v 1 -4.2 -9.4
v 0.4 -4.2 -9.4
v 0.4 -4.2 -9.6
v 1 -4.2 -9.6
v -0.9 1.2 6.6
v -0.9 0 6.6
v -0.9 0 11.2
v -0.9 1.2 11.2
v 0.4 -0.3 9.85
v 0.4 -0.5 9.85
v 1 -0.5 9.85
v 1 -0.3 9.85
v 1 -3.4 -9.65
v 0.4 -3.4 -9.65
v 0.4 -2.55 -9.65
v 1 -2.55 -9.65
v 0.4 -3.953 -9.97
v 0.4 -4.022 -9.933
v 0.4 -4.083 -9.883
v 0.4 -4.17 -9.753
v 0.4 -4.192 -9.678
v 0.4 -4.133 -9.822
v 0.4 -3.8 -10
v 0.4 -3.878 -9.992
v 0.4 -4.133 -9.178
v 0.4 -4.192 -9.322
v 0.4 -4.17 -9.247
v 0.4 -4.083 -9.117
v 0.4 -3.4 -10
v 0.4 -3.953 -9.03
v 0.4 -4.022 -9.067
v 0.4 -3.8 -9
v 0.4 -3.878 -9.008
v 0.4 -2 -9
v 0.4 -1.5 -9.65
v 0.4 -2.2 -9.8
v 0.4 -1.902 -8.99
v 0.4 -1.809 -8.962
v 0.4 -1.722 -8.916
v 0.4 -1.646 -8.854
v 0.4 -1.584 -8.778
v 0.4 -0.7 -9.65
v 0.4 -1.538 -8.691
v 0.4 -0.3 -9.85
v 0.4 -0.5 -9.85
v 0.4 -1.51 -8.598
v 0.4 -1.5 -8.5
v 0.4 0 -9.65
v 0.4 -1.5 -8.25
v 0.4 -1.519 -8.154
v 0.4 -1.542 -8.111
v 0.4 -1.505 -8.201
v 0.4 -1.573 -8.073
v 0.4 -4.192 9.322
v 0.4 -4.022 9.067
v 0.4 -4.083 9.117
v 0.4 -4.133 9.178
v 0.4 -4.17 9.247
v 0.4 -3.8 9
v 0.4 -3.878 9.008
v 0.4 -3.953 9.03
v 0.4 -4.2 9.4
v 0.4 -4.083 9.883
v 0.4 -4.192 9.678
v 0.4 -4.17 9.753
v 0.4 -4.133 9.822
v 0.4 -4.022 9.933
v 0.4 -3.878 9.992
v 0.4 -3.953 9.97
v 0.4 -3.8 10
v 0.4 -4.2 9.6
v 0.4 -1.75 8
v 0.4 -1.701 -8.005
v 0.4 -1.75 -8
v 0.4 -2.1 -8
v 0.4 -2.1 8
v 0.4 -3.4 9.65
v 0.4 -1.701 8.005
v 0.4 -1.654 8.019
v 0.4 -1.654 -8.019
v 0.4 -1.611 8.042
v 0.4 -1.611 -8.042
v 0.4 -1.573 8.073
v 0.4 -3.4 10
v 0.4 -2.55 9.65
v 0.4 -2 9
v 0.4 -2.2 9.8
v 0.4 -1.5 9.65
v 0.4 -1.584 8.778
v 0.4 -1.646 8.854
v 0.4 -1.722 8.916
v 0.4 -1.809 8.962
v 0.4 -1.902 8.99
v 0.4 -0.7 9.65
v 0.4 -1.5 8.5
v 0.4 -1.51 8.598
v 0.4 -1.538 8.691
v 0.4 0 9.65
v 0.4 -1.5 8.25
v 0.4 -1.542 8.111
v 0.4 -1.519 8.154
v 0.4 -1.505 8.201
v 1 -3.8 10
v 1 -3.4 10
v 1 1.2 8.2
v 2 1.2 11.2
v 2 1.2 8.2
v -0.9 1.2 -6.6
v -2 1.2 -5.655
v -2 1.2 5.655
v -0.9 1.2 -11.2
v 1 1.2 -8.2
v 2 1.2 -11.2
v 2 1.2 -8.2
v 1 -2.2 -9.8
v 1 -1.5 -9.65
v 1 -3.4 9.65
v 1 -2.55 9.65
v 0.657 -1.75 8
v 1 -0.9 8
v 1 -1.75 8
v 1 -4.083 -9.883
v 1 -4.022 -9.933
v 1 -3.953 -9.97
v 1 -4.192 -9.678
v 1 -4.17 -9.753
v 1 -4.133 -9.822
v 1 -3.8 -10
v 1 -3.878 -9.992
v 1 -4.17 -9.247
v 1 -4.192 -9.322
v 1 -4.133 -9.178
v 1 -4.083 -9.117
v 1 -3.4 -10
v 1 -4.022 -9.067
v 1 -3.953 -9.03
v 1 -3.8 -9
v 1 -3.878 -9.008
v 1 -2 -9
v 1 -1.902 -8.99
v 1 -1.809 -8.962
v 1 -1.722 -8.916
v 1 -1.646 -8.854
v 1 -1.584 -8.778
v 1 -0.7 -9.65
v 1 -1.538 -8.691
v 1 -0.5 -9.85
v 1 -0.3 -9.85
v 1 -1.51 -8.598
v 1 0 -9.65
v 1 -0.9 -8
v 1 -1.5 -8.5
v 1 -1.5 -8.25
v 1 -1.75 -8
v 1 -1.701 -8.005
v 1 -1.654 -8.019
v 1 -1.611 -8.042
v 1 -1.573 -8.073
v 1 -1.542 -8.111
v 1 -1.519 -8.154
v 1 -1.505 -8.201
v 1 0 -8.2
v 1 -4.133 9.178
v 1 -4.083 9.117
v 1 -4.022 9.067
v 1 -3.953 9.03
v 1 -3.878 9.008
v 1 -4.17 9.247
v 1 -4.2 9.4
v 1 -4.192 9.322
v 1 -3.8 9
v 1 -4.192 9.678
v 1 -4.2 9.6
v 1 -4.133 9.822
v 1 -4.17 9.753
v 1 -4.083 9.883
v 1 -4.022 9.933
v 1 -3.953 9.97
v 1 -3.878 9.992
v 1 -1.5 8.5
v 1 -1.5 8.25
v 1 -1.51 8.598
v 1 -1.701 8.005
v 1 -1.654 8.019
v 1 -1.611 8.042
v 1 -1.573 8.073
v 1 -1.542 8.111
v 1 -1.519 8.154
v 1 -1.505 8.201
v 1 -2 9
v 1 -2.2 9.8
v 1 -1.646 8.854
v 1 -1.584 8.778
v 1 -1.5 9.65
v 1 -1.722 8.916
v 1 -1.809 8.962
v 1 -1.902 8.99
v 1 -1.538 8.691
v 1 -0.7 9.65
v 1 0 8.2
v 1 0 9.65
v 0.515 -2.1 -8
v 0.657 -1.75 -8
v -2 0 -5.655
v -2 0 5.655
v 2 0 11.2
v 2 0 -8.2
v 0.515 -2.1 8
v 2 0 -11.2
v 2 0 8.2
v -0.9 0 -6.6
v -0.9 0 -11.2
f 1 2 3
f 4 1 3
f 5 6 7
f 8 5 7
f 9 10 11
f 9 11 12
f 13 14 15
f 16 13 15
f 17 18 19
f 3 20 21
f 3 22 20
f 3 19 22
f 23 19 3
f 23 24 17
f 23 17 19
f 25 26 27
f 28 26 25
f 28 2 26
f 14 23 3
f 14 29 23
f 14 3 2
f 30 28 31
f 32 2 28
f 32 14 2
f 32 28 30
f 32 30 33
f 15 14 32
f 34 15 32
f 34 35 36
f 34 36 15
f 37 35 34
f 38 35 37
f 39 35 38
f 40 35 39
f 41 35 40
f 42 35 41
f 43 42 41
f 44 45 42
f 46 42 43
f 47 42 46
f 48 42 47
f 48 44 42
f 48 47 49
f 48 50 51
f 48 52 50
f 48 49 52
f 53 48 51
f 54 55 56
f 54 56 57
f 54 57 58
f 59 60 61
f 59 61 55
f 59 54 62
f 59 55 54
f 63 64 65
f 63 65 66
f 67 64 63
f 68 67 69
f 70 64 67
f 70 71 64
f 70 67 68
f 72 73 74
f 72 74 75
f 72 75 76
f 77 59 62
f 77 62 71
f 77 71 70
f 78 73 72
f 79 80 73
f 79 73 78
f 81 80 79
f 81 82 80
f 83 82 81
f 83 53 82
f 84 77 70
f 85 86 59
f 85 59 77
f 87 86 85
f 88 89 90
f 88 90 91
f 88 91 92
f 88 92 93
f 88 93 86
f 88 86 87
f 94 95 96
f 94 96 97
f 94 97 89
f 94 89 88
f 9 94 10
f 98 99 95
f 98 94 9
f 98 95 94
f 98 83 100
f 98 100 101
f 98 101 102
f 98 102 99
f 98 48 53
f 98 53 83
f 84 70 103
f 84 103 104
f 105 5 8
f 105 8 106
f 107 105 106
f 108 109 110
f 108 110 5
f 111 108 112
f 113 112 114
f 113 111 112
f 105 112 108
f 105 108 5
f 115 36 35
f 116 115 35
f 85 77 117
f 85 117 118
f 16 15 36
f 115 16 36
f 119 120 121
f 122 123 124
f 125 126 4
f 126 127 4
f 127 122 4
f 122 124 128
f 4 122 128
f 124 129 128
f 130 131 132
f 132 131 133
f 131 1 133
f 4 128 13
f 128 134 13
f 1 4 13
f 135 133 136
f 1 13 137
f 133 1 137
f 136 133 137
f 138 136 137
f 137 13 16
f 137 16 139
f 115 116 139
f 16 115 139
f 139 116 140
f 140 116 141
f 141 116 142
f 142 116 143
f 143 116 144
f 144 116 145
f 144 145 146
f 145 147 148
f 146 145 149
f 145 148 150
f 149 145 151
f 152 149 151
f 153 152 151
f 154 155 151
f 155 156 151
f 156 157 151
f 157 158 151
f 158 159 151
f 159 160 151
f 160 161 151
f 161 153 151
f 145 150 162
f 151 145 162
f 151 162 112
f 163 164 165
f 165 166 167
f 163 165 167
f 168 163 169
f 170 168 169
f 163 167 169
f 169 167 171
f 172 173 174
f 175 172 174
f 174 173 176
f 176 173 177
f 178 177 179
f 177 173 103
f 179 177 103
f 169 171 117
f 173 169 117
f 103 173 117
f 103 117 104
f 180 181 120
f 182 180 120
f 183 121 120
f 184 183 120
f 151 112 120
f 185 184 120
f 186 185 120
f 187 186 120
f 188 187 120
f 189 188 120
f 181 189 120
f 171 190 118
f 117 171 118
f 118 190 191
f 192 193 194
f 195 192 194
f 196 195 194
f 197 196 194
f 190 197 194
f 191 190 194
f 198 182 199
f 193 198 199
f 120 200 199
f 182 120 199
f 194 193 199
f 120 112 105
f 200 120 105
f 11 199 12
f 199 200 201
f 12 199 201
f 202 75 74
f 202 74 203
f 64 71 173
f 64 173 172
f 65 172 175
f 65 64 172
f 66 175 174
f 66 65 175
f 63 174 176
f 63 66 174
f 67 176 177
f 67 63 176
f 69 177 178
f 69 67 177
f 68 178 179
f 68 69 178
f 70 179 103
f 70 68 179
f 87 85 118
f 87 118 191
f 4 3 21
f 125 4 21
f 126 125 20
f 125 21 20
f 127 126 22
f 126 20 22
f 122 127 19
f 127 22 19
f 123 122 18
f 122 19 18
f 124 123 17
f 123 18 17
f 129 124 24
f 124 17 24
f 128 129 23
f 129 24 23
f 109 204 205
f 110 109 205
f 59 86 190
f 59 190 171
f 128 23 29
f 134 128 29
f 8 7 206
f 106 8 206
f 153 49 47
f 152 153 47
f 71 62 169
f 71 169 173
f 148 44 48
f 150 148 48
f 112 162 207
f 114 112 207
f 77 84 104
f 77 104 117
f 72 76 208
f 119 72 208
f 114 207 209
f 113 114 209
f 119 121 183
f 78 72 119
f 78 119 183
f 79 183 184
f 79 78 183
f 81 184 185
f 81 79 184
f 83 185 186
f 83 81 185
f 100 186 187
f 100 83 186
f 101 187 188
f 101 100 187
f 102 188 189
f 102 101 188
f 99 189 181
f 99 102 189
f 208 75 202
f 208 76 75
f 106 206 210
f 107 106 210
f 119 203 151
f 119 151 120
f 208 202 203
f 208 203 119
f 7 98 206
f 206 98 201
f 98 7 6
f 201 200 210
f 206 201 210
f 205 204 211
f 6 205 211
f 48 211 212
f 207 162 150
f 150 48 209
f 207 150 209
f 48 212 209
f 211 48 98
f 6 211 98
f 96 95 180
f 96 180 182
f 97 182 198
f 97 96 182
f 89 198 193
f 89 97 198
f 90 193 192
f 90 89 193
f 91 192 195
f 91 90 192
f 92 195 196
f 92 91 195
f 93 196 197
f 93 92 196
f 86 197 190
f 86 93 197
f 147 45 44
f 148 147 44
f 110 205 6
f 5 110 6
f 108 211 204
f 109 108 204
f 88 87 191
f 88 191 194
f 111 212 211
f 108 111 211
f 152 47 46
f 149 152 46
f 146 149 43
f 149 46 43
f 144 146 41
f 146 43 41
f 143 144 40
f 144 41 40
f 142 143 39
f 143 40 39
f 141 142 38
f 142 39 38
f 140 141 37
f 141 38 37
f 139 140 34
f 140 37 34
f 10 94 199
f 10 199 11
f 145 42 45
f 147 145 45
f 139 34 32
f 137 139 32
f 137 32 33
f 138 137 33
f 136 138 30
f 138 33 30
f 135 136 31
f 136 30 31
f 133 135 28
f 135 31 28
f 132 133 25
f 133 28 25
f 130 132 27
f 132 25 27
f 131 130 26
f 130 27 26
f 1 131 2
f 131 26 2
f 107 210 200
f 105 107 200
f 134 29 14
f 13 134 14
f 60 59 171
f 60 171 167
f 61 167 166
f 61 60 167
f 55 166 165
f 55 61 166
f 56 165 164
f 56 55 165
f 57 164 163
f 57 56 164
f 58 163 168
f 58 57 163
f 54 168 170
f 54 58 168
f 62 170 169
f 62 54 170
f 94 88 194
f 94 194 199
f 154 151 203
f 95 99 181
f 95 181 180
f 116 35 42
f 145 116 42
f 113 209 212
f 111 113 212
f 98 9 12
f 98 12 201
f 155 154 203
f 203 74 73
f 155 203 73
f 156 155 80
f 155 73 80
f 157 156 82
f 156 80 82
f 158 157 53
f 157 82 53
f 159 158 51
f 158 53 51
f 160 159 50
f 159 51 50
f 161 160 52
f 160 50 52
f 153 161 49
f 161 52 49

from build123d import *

# Parameters (mm, degrees)
RESSALTO_EXTRUS_O1_DEPTH = 1.2
ESBO_O2_W                = 0.6
ESBO_O2_H                = 16
RESSALTO_EXTRUS_O2_DEPTH = 2.1
CHANFRO1_SIZE            = 1.2
CHANFRO1_SIZE2           = 0.484831471
RESSALTO_EXTRUS_O3_DEPTH = 0.6


with BuildPart() as part:
    # Esboço1 → Ressalto-extrusão1 (new body)
    with BuildSketch(Plane(origin=(0, 0, 0), x_dir=(1, 0, 0), z_dir=(0, 1, 0))):
        Polygon((2, 8.2), (2, 11.2), (-0.9, 11.2), (-0.9, 6.6), (-2, 5.654746766), (-2, -5.654746766), (-0.9, -6.6), (-0.9, -11.2), (2, -11.2), (2, -8.2), (1, -8.2), (1, 8.2), align=None)
    extrude(amount=RESSALTO_EXTRUS_O1_DEPTH)

    # Esboço2 → Ressalto-extrusão2 (add)
    with BuildSketch(Plane.XZ):
        with Locations((0.7, 0)):
            Rectangle(ESBO_O2_W, ESBO_O2_H)
    extrude(amount=RESSALTO_EXTRUS_O2_DEPTH)

    # Chanfro1
    chanfro1_edges = [part.edges().sort_by_distance(p)[0] for p in [
        (1, -2.1, 0),
    ]]
    chanfro1_side = [part.faces().sort_by_distance(p)[0] for p in [
        (1, -0.440540541, 0),
    ]]
    chamfer(chanfro1_edges, length=CHANFRO1_SIZE, length2=CHANFRO1_SIZE2, reference=chanfro1_side[0])

    # Esboço3 → Ressalto-extrusão3 (add)
    with BuildSketch(Plane.ZY.offset(-0.4)):
        with BuildLine():
            Line((-8.25, -1.5), (-8.5, -1.5))
            ThreePointArc((-8.5, -1.5), (-8.853553391, -1.646446609), (-9, -2))
            Line((-9, -2), (-9, -3.8))
            ThreePointArc((-9, -3.8), (-9.117157288, -4.082842712), (-9.4, -4.2))
            Line((-9.4, -4.2), (-9.6, -4.2))
            ThreePointArc((-9.6, -4.2), (-9.882842712, -4.082842712), (-10, -3.8))
            Line((-10, -3.8), (-10, -3.4))
            Line((-10, -3.4), (-9.65, -3.4))
            Line((-9.65, -3.4), (-9.65, -2.55))
            Line((-9.65, -2.55), (-9.8, -2.2))
            Line((-9.8, -2.2), (-9.65, -1.5))
            Line((-9.65, -1.5), (-9.65, -0.7))
            Line((-9.65, -0.7), (-9.85, -0.5))
            Line((-9.85, -0.5), (-9.85, -0.3))
            Line((-9.85, -0.3), (-9.65, 0))
            Line((-9.65, 0), (-8, 0))
            Line((-8, 0), (-8, -1.75))
            ThreePointArc((-8, -1.75), (-8.073223305, -1.573223305), (-8.25, -1.5))
        make_face()
    ressalto_extrus_o3 = extrude(amount=-RESSALTO_EXTRUS_O3_DEPTH)

    # Espelhar1: Ressalto-extrusão3 across plane
    add(ressalto_extrus_o3.mirror(Plane.XY))


solid = part.part
